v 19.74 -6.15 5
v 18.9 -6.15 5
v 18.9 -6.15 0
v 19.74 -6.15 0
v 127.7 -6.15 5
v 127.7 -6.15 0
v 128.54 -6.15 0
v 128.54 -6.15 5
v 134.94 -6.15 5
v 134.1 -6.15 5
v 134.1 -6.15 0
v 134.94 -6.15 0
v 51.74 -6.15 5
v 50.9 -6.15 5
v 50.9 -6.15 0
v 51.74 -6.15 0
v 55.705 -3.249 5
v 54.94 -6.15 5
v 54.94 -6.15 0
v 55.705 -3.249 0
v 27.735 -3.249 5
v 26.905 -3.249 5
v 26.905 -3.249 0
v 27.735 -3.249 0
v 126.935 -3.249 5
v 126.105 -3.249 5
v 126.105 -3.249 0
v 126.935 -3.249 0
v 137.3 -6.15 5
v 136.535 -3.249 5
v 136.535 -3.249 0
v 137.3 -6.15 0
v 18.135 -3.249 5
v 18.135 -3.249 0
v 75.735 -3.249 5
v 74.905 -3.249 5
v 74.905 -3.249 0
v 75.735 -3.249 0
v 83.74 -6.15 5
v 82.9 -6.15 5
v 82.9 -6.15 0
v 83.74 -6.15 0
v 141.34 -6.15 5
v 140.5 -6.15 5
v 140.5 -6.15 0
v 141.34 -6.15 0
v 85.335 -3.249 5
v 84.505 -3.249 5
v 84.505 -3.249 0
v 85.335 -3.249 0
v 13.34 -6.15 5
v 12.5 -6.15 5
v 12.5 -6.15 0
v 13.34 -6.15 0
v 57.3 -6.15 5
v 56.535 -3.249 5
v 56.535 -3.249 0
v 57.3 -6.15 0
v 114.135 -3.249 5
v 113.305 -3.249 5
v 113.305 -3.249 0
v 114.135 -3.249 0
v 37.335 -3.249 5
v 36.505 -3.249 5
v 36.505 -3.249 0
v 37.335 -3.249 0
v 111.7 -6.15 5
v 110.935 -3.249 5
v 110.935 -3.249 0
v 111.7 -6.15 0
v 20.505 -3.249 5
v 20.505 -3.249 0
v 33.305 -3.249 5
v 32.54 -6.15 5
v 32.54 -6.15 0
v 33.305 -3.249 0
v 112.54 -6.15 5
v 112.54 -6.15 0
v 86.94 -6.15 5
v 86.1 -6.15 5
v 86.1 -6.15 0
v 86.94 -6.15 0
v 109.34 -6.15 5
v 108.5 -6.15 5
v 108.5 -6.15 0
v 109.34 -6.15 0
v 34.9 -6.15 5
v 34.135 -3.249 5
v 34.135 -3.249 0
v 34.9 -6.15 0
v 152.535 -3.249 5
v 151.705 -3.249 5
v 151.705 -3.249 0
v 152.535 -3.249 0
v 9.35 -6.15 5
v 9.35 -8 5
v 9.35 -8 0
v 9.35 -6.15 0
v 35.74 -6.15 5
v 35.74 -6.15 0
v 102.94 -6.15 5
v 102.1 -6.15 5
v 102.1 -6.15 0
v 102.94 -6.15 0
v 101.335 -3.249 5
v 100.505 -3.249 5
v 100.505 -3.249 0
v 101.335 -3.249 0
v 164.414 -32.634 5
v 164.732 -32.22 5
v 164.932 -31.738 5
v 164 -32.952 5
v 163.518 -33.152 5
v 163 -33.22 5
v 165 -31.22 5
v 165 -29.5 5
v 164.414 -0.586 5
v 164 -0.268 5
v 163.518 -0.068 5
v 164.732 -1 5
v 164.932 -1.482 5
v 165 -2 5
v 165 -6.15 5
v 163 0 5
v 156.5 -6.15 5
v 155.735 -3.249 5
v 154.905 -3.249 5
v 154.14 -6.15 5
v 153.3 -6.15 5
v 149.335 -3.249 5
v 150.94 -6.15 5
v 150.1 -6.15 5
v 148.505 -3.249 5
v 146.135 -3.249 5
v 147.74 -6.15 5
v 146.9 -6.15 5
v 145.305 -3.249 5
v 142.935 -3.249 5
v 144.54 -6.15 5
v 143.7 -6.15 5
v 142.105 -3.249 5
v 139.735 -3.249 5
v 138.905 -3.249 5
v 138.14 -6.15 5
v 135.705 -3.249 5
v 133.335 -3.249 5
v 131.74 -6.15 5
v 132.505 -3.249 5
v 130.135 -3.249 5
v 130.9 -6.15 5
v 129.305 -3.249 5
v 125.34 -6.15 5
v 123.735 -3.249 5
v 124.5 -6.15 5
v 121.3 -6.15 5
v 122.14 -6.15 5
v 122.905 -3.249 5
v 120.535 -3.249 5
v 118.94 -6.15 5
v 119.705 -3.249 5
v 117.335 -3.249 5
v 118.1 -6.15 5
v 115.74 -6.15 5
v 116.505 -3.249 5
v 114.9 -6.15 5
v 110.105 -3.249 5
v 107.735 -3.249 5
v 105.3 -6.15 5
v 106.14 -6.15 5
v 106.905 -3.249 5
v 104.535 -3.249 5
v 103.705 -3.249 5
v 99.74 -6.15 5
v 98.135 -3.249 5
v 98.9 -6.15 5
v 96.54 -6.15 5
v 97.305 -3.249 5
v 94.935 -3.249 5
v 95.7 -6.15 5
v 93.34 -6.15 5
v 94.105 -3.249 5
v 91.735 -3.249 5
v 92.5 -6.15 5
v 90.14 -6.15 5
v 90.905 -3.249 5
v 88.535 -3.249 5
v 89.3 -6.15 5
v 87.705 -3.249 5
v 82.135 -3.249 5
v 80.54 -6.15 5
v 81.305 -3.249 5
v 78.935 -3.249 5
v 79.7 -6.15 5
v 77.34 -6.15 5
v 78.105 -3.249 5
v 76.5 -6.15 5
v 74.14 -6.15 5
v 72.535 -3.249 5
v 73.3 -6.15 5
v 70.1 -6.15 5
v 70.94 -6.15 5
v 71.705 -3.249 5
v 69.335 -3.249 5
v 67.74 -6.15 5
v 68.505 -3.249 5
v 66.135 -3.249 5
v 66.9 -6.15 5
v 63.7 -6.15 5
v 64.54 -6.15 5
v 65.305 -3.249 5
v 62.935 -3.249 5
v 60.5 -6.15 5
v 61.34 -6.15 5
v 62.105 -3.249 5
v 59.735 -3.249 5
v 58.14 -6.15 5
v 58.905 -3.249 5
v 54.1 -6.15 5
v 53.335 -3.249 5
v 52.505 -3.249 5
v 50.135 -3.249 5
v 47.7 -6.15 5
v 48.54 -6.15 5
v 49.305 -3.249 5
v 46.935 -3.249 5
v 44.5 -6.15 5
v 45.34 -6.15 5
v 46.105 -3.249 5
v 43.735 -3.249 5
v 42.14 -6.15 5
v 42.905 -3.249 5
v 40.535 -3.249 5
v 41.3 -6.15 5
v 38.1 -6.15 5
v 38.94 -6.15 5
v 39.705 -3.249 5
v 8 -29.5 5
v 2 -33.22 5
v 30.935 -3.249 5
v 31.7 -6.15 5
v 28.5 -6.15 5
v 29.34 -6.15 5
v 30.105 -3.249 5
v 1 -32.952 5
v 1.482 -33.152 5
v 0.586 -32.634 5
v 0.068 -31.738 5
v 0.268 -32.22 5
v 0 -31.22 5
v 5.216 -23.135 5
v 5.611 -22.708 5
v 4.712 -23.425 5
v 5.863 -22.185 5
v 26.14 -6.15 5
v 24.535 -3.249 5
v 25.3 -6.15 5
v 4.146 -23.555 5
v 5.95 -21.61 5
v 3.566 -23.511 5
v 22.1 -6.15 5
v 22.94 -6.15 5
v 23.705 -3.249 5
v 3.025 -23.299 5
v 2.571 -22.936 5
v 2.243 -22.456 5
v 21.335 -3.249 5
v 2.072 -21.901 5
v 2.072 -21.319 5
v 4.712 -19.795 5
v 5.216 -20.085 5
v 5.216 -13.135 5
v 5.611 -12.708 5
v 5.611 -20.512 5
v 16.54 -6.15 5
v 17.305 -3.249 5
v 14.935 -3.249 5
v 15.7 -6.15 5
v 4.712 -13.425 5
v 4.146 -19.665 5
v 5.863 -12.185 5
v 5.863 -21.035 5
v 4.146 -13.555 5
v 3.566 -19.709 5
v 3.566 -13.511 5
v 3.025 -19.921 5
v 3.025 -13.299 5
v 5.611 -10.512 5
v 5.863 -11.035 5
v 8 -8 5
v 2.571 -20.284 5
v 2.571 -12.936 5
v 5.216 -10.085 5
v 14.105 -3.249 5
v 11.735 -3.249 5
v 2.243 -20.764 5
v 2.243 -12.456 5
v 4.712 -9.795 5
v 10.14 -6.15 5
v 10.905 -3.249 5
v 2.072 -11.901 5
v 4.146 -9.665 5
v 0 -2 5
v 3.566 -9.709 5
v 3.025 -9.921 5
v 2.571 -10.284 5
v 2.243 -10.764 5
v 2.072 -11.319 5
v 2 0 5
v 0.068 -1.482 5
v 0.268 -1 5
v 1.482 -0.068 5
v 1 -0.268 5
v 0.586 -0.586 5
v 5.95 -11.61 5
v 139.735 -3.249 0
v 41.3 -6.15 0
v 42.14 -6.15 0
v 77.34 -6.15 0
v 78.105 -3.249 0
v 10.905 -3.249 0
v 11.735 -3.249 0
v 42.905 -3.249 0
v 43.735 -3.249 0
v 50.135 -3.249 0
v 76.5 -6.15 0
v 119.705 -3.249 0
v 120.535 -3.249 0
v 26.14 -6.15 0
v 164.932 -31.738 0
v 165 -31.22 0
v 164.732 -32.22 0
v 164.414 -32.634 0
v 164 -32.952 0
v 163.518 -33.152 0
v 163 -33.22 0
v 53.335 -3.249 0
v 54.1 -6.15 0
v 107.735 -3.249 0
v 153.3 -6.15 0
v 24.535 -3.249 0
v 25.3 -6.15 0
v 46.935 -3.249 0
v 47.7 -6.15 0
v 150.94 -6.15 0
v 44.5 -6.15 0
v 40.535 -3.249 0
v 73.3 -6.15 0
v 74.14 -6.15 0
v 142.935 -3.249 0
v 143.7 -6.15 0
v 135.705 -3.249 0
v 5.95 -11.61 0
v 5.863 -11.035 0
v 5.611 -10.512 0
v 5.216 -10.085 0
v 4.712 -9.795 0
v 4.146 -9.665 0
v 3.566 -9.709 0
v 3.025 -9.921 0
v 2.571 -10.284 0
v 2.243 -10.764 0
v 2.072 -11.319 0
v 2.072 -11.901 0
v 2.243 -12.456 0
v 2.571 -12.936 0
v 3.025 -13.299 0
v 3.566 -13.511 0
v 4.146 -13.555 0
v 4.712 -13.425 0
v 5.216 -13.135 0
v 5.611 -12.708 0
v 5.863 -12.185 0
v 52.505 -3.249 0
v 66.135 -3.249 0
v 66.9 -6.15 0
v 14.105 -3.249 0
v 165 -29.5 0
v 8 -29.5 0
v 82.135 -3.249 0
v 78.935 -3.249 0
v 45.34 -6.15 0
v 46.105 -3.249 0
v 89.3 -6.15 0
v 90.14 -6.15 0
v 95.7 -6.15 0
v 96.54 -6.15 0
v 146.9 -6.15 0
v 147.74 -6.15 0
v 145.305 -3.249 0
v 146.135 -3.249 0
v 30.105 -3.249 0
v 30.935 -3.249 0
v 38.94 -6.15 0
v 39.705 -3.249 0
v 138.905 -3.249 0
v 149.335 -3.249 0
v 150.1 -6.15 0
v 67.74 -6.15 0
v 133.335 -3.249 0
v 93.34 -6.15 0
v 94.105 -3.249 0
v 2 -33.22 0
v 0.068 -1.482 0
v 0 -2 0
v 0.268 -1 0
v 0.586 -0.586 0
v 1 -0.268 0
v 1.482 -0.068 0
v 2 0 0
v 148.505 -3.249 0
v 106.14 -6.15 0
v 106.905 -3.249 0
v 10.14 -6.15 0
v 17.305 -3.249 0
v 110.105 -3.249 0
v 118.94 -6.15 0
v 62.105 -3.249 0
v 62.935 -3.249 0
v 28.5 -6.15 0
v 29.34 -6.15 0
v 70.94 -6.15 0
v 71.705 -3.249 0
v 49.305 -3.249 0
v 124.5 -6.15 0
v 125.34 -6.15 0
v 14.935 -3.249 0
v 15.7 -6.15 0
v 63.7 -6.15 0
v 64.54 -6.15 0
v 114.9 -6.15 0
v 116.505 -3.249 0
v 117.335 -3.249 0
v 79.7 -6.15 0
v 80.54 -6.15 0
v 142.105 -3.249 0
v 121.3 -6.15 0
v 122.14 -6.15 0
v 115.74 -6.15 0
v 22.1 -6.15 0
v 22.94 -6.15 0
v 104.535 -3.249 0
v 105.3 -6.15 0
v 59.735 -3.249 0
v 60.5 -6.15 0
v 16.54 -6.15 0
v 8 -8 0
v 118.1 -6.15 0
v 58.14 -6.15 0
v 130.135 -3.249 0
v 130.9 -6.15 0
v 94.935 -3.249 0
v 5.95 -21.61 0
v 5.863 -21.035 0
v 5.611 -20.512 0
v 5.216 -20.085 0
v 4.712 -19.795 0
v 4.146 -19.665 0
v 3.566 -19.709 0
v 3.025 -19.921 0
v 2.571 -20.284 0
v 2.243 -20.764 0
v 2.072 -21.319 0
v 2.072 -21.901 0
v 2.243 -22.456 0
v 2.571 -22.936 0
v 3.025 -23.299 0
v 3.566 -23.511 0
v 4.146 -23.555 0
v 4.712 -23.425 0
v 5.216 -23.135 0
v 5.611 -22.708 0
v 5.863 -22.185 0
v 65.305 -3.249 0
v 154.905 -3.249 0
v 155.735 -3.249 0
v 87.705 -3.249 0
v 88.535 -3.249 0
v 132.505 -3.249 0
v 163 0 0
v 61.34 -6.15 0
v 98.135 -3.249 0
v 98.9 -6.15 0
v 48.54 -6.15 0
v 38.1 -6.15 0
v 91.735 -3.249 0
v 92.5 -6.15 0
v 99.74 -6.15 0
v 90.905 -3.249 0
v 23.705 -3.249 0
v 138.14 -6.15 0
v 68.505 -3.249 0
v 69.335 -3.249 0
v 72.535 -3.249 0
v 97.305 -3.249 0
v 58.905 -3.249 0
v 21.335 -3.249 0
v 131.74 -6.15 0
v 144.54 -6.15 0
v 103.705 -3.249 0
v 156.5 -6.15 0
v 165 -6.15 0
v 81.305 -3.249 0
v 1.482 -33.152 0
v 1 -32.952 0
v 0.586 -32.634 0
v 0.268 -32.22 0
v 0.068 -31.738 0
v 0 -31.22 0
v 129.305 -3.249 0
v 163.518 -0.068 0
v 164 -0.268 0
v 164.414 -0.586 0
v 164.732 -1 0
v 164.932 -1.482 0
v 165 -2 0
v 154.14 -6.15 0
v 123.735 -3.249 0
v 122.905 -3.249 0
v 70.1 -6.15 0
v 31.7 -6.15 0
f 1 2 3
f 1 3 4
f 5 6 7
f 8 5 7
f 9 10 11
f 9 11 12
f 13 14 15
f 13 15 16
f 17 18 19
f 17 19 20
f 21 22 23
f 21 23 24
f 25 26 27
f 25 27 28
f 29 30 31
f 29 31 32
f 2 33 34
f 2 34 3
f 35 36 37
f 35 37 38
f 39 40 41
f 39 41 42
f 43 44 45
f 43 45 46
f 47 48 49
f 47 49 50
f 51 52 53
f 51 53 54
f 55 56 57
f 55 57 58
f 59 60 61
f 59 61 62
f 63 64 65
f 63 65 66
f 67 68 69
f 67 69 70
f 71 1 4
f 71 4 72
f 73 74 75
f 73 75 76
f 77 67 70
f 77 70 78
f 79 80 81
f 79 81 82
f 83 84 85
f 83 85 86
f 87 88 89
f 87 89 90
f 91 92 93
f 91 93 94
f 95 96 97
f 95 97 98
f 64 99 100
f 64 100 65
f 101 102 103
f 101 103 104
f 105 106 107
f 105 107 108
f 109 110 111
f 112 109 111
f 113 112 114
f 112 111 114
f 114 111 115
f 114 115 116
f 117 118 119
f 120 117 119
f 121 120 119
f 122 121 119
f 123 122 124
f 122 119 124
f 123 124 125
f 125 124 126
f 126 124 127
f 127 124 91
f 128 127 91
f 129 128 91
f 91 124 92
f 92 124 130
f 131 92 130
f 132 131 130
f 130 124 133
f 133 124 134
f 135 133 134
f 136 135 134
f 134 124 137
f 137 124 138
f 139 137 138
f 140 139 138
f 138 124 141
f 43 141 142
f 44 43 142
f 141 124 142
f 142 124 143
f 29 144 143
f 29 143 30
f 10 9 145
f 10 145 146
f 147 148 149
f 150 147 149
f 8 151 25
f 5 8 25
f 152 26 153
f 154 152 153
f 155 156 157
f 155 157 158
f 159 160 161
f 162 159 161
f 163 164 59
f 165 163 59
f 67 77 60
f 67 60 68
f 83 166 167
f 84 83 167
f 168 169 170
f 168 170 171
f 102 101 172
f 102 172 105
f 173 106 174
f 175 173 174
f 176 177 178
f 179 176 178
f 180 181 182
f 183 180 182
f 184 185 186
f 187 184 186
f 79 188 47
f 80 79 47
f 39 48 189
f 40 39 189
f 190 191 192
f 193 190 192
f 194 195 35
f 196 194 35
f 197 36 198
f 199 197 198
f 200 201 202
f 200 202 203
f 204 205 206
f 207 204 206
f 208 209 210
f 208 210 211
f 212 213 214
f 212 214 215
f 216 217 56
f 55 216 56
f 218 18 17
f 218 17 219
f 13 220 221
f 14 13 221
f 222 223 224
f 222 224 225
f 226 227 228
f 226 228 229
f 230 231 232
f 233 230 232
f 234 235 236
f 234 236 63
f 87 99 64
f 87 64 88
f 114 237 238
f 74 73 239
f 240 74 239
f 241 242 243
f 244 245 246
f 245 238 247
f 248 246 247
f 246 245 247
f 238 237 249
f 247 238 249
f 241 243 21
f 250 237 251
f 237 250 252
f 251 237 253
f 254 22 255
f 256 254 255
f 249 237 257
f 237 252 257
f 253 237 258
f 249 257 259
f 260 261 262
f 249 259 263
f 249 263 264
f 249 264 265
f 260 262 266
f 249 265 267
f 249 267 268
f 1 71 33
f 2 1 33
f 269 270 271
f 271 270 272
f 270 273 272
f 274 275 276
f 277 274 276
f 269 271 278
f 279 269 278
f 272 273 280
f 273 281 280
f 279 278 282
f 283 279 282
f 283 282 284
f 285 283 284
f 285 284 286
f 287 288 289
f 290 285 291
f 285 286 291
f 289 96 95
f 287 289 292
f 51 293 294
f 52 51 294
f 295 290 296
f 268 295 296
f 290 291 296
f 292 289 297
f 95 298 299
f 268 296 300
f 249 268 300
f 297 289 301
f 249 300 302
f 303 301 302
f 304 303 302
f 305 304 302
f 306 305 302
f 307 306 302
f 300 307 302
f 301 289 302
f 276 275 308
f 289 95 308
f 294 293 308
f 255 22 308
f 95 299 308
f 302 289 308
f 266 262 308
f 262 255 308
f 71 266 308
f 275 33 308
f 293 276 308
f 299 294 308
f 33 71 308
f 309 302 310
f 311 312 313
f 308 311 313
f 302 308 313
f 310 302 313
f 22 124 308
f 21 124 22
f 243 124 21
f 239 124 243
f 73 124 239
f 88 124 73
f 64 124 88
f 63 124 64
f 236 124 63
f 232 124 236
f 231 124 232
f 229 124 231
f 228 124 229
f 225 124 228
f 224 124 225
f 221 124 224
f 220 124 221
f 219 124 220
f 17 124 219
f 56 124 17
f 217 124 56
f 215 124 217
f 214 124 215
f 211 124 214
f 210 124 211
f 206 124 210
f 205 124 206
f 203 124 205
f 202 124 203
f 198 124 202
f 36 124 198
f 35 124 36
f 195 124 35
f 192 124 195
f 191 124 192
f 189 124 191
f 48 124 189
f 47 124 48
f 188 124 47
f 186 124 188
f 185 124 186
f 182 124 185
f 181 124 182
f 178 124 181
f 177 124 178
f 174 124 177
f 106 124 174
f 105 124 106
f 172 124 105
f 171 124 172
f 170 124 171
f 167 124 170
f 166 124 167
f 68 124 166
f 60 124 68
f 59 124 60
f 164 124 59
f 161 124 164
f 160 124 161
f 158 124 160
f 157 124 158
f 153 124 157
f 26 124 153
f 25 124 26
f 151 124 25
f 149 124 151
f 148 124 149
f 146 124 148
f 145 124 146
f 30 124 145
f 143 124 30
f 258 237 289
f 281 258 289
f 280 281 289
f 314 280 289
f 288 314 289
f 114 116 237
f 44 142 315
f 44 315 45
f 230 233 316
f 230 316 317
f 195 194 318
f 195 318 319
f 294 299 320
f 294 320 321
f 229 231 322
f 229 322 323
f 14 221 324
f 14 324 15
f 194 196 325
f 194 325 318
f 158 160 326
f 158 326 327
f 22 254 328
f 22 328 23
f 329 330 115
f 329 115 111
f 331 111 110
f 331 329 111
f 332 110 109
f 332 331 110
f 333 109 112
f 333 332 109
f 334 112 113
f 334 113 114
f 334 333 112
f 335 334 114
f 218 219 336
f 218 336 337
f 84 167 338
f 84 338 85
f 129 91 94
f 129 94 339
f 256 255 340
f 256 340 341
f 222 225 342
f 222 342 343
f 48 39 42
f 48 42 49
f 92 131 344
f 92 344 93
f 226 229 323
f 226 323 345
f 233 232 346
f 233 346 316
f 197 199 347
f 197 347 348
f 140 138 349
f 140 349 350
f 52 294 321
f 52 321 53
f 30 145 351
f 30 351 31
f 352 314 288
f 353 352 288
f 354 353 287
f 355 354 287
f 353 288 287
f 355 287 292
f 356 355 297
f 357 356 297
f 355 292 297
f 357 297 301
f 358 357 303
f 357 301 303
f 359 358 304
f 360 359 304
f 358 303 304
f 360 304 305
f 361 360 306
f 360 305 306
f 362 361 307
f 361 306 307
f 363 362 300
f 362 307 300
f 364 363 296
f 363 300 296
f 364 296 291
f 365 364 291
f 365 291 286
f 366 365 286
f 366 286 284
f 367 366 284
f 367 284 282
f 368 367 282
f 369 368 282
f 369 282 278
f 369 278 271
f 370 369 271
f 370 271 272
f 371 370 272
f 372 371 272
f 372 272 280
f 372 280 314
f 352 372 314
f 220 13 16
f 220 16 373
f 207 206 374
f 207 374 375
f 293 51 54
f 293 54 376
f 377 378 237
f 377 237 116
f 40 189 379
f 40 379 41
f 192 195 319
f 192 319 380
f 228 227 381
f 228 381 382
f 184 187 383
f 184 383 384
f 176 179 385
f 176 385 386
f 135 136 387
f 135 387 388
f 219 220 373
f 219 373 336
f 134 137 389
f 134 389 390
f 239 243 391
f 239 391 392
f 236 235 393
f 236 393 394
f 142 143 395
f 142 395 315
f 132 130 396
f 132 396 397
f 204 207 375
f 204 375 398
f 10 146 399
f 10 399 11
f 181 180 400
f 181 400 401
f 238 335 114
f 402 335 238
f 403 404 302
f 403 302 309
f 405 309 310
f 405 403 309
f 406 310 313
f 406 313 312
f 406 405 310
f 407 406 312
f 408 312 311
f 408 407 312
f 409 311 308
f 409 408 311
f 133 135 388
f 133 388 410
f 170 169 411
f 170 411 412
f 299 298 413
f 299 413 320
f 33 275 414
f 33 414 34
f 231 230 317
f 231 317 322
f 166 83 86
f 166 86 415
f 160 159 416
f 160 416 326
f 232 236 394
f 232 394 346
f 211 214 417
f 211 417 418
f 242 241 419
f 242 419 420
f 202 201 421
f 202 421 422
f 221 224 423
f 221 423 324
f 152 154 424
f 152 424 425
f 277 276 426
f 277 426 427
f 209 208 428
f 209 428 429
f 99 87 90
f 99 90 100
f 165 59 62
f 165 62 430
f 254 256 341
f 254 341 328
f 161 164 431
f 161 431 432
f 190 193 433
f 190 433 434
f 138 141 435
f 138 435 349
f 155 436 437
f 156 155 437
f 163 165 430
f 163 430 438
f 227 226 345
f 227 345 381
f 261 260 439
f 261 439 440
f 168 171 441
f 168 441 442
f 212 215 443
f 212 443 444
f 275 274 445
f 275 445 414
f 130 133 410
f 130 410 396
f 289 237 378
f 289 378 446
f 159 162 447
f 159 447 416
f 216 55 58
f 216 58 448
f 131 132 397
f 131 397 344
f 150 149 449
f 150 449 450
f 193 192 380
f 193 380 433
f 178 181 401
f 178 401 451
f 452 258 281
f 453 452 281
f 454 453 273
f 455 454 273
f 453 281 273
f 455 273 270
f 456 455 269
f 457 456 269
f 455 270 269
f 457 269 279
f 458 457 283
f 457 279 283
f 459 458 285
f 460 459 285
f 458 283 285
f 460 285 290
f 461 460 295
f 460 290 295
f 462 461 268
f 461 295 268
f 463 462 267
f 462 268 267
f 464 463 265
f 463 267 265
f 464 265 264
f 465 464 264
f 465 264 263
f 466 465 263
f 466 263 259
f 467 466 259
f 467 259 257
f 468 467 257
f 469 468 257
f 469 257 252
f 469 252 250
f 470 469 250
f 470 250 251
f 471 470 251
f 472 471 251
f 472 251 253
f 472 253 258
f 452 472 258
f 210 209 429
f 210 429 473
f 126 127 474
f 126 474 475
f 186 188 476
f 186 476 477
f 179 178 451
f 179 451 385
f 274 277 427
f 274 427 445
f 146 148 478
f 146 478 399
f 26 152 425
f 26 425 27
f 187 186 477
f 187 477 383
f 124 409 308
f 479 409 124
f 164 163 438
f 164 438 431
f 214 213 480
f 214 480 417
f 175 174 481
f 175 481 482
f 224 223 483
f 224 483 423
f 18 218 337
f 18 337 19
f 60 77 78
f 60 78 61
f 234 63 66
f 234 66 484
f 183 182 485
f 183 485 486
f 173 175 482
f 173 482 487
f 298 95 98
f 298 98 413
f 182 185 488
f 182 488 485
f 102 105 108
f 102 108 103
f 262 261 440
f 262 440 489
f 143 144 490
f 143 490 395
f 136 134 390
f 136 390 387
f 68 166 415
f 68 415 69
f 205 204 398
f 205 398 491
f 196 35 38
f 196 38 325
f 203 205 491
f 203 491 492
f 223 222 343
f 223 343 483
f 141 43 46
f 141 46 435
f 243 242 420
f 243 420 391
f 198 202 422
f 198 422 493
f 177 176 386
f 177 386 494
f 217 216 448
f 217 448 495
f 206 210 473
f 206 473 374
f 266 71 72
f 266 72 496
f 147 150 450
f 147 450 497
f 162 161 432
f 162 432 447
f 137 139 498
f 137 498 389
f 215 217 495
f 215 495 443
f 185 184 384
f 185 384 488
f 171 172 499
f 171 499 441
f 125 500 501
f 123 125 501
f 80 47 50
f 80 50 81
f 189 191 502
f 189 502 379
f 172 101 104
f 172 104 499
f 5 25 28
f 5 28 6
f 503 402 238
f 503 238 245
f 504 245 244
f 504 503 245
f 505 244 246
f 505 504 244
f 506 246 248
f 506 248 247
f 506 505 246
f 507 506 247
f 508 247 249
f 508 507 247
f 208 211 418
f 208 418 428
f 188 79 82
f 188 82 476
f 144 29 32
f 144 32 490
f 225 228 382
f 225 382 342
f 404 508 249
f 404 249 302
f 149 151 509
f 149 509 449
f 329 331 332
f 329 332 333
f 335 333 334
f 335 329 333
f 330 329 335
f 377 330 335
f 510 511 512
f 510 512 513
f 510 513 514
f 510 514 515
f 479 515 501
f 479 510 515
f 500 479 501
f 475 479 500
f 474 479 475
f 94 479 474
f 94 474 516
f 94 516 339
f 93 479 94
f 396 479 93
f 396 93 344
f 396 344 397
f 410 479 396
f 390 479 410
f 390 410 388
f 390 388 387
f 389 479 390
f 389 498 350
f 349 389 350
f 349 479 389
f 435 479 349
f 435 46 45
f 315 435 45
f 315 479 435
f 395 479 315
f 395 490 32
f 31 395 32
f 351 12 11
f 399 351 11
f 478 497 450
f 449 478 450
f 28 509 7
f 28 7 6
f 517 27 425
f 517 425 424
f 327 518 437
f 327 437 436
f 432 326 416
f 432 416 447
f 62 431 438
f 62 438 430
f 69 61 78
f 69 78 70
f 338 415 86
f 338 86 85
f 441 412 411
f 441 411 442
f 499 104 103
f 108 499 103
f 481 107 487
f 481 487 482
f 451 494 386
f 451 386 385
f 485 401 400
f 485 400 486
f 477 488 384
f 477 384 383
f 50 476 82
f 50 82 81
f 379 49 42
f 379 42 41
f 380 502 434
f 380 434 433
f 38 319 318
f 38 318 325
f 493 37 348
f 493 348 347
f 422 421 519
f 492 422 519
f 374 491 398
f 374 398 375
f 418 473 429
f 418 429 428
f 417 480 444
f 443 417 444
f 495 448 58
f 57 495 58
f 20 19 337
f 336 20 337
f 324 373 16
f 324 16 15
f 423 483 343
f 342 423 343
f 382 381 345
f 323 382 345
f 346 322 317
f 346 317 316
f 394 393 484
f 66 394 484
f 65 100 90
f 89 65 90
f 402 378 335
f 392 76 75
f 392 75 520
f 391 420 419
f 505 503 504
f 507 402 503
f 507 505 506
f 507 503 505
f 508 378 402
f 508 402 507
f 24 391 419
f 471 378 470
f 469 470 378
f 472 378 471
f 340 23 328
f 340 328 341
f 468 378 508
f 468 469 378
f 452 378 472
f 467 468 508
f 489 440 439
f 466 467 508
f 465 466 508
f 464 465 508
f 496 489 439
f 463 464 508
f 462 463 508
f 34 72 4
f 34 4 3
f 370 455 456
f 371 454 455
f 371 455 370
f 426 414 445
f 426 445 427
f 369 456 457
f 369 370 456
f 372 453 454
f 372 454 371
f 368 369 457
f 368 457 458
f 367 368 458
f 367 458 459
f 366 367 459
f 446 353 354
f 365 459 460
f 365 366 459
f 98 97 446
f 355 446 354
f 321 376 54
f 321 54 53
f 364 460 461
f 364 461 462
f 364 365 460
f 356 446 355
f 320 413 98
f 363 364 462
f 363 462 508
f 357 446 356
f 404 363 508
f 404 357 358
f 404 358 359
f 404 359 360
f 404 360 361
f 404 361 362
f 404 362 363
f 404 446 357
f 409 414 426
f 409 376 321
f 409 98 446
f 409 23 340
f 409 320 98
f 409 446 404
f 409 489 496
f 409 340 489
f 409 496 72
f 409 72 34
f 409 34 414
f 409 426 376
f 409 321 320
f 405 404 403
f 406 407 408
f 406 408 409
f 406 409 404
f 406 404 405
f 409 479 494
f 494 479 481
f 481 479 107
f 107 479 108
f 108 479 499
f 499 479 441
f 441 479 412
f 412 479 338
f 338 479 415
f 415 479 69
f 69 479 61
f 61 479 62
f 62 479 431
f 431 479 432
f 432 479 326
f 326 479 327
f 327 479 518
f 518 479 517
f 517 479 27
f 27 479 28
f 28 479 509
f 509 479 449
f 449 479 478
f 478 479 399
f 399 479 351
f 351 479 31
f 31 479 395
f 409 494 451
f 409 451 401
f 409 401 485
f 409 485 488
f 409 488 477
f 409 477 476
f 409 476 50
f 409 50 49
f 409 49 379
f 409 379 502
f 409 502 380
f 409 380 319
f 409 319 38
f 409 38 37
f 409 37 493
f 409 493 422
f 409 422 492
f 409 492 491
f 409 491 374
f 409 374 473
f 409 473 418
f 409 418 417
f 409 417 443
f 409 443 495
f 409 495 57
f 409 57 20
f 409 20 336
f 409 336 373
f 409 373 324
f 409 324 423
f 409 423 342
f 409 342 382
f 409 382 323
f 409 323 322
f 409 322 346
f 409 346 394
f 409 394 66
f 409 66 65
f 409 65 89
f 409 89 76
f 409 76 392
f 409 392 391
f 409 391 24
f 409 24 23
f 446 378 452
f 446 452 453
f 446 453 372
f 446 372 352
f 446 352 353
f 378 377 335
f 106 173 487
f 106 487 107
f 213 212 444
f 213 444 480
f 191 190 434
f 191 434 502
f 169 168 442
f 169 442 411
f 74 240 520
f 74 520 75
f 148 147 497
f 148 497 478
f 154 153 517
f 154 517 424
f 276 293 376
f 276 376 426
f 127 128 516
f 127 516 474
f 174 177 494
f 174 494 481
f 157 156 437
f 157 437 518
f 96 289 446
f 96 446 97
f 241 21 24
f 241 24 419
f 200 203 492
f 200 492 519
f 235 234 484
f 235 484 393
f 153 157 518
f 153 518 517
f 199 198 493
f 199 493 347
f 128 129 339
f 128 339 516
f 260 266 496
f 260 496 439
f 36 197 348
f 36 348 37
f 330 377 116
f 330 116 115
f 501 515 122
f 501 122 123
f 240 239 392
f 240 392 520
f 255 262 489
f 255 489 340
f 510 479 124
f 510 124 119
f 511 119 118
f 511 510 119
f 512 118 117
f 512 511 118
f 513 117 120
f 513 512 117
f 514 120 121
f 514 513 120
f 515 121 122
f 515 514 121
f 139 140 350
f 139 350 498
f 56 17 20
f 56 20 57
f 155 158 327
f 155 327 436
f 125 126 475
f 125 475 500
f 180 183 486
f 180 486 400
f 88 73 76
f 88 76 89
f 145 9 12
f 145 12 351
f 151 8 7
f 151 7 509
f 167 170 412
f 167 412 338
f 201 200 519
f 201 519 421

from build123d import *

# Parameters (mm, degrees)
BOSS_EXTRUDE1_DEPTH = 5
SKETCH2_W           = 149
SKETCH2_H           = 21.5
CUT_EXTRUDE1_DEPTH  = 6
SKETCH3_W           = 145.97
SKETCH3_H           = 1.85
CUT_EXTRUDE2_DEPTH  = 6
CUT_EXTRUDE4_DEPTH  = 6
LPATTERN1_COUNT     = 46
LPATTERN1_PITCH     = 3.2
SKETCH5_R           = 1.95
CUT_EXTRUDE5_DEPTH  = 10
SKETCH8_W           = 12.491366173
SKETCH8_H           = 5
CUT_EXTRUDE6_DEPTH  = 23.35


with BuildPart() as part:
    # Sketch1 → Boss-Extrude1 (new body)
    with BuildSketch(Plane.XY):
        with BuildLine():
            Line((2, 0), (163, 0))
            ThreePointArc((163, 0), (164.414213562, -0.585786438), (165, -2))
            Line((165, -2), (165, -31.22))
            ThreePointArc((165, -31.22), (164.414213562, -32.634213562), (163, -33.22))
            Line((163, -33.22), (2, -33.22))
            ThreePointArc((2, -33.22), (0.585786438, -32.634213562), (0, -31.22))
            Line((0, -31.22), (0, -2))
            ThreePointArc((0, -2), (0.585786438, -0.585786438), (2, 0))
        make_face()
    extrude(amount=BOSS_EXTRUDE1_DEPTH)

    # Sketch2 → Cut-Extrude1 (cut, through all)
    with BuildSketch(Plane.XY.offset(5)):
        with Locations((82.5, -18.75)):
            Rectangle(SKETCH2_W, SKETCH2_H)
    extrude(amount=-CUT_EXTRUDE1_DEPTH, mode=Mode.SUBTRACT)

    # Sketch3 → Cut-Extrude2 (cut, through all)
    with BuildSketch(Plane.XY.offset(5)):
        with Locations((82.335, -7.075)):
            Rectangle(SKETCH3_W, SKETCH3_H)
    extrude(amount=-CUT_EXTRUDE2_DEPTH, mode=Mode.SUBTRACT)

    # Sketch4 → Cut-Extrude4 (cut, through all)
    with BuildSketch(Plane.XY.offset(5)):
        Polygon((155.735, -3.249176841), (156.5, -6.15), (154.14, -6.15), (154.905, -3.249176841), align=None)
    cut_extrude4 = extrude(amount=-CUT_EXTRUDE4_DEPTH, mode=Mode.SUBTRACT)

    # LPattern1: Cut-Extrude4 ×46
    with Locations(*[(-i * LPATTERN1_PITCH, 0, 0) for i in range(1, LPATTERN1_COUNT)]):
        add(cut_extrude4, mode=Mode.SUBTRACT)

    # Sketch5 → Cut-Extrude5 (cut)
    with BuildSketch(Plane.XY.offset(5)):
        with Locations((4, -11.61)):
            Circle(SKETCH5_R)
        with Locations((4, -21.61)):
            Circle(SKETCH5_R)
        with Locations((161, -11.61)):
            Circle(SKETCH5_R)
        with Locations((161, -21.61)):
            Circle(SKETCH5_R)
    extrude(amount=-CUT_EXTRUDE5_DEPTH, mode=Mode.SUBTRACT)

    # Sketch8 → Cut-Extrude6 (cut)
    with BuildSketch(Plane(origin=(0, -29.5, 0), x_dir=(1, 0, 0), z_dir=(0, 1, 0))):
        with Locations((158.754316914, -2.5)):
            Rectangle(SKETCH8_W, SKETCH8_H)
    extrude(amount=CUT_EXTRUDE6_DEPTH, mode=Mode.SUBTRACT)


solid = part.part
